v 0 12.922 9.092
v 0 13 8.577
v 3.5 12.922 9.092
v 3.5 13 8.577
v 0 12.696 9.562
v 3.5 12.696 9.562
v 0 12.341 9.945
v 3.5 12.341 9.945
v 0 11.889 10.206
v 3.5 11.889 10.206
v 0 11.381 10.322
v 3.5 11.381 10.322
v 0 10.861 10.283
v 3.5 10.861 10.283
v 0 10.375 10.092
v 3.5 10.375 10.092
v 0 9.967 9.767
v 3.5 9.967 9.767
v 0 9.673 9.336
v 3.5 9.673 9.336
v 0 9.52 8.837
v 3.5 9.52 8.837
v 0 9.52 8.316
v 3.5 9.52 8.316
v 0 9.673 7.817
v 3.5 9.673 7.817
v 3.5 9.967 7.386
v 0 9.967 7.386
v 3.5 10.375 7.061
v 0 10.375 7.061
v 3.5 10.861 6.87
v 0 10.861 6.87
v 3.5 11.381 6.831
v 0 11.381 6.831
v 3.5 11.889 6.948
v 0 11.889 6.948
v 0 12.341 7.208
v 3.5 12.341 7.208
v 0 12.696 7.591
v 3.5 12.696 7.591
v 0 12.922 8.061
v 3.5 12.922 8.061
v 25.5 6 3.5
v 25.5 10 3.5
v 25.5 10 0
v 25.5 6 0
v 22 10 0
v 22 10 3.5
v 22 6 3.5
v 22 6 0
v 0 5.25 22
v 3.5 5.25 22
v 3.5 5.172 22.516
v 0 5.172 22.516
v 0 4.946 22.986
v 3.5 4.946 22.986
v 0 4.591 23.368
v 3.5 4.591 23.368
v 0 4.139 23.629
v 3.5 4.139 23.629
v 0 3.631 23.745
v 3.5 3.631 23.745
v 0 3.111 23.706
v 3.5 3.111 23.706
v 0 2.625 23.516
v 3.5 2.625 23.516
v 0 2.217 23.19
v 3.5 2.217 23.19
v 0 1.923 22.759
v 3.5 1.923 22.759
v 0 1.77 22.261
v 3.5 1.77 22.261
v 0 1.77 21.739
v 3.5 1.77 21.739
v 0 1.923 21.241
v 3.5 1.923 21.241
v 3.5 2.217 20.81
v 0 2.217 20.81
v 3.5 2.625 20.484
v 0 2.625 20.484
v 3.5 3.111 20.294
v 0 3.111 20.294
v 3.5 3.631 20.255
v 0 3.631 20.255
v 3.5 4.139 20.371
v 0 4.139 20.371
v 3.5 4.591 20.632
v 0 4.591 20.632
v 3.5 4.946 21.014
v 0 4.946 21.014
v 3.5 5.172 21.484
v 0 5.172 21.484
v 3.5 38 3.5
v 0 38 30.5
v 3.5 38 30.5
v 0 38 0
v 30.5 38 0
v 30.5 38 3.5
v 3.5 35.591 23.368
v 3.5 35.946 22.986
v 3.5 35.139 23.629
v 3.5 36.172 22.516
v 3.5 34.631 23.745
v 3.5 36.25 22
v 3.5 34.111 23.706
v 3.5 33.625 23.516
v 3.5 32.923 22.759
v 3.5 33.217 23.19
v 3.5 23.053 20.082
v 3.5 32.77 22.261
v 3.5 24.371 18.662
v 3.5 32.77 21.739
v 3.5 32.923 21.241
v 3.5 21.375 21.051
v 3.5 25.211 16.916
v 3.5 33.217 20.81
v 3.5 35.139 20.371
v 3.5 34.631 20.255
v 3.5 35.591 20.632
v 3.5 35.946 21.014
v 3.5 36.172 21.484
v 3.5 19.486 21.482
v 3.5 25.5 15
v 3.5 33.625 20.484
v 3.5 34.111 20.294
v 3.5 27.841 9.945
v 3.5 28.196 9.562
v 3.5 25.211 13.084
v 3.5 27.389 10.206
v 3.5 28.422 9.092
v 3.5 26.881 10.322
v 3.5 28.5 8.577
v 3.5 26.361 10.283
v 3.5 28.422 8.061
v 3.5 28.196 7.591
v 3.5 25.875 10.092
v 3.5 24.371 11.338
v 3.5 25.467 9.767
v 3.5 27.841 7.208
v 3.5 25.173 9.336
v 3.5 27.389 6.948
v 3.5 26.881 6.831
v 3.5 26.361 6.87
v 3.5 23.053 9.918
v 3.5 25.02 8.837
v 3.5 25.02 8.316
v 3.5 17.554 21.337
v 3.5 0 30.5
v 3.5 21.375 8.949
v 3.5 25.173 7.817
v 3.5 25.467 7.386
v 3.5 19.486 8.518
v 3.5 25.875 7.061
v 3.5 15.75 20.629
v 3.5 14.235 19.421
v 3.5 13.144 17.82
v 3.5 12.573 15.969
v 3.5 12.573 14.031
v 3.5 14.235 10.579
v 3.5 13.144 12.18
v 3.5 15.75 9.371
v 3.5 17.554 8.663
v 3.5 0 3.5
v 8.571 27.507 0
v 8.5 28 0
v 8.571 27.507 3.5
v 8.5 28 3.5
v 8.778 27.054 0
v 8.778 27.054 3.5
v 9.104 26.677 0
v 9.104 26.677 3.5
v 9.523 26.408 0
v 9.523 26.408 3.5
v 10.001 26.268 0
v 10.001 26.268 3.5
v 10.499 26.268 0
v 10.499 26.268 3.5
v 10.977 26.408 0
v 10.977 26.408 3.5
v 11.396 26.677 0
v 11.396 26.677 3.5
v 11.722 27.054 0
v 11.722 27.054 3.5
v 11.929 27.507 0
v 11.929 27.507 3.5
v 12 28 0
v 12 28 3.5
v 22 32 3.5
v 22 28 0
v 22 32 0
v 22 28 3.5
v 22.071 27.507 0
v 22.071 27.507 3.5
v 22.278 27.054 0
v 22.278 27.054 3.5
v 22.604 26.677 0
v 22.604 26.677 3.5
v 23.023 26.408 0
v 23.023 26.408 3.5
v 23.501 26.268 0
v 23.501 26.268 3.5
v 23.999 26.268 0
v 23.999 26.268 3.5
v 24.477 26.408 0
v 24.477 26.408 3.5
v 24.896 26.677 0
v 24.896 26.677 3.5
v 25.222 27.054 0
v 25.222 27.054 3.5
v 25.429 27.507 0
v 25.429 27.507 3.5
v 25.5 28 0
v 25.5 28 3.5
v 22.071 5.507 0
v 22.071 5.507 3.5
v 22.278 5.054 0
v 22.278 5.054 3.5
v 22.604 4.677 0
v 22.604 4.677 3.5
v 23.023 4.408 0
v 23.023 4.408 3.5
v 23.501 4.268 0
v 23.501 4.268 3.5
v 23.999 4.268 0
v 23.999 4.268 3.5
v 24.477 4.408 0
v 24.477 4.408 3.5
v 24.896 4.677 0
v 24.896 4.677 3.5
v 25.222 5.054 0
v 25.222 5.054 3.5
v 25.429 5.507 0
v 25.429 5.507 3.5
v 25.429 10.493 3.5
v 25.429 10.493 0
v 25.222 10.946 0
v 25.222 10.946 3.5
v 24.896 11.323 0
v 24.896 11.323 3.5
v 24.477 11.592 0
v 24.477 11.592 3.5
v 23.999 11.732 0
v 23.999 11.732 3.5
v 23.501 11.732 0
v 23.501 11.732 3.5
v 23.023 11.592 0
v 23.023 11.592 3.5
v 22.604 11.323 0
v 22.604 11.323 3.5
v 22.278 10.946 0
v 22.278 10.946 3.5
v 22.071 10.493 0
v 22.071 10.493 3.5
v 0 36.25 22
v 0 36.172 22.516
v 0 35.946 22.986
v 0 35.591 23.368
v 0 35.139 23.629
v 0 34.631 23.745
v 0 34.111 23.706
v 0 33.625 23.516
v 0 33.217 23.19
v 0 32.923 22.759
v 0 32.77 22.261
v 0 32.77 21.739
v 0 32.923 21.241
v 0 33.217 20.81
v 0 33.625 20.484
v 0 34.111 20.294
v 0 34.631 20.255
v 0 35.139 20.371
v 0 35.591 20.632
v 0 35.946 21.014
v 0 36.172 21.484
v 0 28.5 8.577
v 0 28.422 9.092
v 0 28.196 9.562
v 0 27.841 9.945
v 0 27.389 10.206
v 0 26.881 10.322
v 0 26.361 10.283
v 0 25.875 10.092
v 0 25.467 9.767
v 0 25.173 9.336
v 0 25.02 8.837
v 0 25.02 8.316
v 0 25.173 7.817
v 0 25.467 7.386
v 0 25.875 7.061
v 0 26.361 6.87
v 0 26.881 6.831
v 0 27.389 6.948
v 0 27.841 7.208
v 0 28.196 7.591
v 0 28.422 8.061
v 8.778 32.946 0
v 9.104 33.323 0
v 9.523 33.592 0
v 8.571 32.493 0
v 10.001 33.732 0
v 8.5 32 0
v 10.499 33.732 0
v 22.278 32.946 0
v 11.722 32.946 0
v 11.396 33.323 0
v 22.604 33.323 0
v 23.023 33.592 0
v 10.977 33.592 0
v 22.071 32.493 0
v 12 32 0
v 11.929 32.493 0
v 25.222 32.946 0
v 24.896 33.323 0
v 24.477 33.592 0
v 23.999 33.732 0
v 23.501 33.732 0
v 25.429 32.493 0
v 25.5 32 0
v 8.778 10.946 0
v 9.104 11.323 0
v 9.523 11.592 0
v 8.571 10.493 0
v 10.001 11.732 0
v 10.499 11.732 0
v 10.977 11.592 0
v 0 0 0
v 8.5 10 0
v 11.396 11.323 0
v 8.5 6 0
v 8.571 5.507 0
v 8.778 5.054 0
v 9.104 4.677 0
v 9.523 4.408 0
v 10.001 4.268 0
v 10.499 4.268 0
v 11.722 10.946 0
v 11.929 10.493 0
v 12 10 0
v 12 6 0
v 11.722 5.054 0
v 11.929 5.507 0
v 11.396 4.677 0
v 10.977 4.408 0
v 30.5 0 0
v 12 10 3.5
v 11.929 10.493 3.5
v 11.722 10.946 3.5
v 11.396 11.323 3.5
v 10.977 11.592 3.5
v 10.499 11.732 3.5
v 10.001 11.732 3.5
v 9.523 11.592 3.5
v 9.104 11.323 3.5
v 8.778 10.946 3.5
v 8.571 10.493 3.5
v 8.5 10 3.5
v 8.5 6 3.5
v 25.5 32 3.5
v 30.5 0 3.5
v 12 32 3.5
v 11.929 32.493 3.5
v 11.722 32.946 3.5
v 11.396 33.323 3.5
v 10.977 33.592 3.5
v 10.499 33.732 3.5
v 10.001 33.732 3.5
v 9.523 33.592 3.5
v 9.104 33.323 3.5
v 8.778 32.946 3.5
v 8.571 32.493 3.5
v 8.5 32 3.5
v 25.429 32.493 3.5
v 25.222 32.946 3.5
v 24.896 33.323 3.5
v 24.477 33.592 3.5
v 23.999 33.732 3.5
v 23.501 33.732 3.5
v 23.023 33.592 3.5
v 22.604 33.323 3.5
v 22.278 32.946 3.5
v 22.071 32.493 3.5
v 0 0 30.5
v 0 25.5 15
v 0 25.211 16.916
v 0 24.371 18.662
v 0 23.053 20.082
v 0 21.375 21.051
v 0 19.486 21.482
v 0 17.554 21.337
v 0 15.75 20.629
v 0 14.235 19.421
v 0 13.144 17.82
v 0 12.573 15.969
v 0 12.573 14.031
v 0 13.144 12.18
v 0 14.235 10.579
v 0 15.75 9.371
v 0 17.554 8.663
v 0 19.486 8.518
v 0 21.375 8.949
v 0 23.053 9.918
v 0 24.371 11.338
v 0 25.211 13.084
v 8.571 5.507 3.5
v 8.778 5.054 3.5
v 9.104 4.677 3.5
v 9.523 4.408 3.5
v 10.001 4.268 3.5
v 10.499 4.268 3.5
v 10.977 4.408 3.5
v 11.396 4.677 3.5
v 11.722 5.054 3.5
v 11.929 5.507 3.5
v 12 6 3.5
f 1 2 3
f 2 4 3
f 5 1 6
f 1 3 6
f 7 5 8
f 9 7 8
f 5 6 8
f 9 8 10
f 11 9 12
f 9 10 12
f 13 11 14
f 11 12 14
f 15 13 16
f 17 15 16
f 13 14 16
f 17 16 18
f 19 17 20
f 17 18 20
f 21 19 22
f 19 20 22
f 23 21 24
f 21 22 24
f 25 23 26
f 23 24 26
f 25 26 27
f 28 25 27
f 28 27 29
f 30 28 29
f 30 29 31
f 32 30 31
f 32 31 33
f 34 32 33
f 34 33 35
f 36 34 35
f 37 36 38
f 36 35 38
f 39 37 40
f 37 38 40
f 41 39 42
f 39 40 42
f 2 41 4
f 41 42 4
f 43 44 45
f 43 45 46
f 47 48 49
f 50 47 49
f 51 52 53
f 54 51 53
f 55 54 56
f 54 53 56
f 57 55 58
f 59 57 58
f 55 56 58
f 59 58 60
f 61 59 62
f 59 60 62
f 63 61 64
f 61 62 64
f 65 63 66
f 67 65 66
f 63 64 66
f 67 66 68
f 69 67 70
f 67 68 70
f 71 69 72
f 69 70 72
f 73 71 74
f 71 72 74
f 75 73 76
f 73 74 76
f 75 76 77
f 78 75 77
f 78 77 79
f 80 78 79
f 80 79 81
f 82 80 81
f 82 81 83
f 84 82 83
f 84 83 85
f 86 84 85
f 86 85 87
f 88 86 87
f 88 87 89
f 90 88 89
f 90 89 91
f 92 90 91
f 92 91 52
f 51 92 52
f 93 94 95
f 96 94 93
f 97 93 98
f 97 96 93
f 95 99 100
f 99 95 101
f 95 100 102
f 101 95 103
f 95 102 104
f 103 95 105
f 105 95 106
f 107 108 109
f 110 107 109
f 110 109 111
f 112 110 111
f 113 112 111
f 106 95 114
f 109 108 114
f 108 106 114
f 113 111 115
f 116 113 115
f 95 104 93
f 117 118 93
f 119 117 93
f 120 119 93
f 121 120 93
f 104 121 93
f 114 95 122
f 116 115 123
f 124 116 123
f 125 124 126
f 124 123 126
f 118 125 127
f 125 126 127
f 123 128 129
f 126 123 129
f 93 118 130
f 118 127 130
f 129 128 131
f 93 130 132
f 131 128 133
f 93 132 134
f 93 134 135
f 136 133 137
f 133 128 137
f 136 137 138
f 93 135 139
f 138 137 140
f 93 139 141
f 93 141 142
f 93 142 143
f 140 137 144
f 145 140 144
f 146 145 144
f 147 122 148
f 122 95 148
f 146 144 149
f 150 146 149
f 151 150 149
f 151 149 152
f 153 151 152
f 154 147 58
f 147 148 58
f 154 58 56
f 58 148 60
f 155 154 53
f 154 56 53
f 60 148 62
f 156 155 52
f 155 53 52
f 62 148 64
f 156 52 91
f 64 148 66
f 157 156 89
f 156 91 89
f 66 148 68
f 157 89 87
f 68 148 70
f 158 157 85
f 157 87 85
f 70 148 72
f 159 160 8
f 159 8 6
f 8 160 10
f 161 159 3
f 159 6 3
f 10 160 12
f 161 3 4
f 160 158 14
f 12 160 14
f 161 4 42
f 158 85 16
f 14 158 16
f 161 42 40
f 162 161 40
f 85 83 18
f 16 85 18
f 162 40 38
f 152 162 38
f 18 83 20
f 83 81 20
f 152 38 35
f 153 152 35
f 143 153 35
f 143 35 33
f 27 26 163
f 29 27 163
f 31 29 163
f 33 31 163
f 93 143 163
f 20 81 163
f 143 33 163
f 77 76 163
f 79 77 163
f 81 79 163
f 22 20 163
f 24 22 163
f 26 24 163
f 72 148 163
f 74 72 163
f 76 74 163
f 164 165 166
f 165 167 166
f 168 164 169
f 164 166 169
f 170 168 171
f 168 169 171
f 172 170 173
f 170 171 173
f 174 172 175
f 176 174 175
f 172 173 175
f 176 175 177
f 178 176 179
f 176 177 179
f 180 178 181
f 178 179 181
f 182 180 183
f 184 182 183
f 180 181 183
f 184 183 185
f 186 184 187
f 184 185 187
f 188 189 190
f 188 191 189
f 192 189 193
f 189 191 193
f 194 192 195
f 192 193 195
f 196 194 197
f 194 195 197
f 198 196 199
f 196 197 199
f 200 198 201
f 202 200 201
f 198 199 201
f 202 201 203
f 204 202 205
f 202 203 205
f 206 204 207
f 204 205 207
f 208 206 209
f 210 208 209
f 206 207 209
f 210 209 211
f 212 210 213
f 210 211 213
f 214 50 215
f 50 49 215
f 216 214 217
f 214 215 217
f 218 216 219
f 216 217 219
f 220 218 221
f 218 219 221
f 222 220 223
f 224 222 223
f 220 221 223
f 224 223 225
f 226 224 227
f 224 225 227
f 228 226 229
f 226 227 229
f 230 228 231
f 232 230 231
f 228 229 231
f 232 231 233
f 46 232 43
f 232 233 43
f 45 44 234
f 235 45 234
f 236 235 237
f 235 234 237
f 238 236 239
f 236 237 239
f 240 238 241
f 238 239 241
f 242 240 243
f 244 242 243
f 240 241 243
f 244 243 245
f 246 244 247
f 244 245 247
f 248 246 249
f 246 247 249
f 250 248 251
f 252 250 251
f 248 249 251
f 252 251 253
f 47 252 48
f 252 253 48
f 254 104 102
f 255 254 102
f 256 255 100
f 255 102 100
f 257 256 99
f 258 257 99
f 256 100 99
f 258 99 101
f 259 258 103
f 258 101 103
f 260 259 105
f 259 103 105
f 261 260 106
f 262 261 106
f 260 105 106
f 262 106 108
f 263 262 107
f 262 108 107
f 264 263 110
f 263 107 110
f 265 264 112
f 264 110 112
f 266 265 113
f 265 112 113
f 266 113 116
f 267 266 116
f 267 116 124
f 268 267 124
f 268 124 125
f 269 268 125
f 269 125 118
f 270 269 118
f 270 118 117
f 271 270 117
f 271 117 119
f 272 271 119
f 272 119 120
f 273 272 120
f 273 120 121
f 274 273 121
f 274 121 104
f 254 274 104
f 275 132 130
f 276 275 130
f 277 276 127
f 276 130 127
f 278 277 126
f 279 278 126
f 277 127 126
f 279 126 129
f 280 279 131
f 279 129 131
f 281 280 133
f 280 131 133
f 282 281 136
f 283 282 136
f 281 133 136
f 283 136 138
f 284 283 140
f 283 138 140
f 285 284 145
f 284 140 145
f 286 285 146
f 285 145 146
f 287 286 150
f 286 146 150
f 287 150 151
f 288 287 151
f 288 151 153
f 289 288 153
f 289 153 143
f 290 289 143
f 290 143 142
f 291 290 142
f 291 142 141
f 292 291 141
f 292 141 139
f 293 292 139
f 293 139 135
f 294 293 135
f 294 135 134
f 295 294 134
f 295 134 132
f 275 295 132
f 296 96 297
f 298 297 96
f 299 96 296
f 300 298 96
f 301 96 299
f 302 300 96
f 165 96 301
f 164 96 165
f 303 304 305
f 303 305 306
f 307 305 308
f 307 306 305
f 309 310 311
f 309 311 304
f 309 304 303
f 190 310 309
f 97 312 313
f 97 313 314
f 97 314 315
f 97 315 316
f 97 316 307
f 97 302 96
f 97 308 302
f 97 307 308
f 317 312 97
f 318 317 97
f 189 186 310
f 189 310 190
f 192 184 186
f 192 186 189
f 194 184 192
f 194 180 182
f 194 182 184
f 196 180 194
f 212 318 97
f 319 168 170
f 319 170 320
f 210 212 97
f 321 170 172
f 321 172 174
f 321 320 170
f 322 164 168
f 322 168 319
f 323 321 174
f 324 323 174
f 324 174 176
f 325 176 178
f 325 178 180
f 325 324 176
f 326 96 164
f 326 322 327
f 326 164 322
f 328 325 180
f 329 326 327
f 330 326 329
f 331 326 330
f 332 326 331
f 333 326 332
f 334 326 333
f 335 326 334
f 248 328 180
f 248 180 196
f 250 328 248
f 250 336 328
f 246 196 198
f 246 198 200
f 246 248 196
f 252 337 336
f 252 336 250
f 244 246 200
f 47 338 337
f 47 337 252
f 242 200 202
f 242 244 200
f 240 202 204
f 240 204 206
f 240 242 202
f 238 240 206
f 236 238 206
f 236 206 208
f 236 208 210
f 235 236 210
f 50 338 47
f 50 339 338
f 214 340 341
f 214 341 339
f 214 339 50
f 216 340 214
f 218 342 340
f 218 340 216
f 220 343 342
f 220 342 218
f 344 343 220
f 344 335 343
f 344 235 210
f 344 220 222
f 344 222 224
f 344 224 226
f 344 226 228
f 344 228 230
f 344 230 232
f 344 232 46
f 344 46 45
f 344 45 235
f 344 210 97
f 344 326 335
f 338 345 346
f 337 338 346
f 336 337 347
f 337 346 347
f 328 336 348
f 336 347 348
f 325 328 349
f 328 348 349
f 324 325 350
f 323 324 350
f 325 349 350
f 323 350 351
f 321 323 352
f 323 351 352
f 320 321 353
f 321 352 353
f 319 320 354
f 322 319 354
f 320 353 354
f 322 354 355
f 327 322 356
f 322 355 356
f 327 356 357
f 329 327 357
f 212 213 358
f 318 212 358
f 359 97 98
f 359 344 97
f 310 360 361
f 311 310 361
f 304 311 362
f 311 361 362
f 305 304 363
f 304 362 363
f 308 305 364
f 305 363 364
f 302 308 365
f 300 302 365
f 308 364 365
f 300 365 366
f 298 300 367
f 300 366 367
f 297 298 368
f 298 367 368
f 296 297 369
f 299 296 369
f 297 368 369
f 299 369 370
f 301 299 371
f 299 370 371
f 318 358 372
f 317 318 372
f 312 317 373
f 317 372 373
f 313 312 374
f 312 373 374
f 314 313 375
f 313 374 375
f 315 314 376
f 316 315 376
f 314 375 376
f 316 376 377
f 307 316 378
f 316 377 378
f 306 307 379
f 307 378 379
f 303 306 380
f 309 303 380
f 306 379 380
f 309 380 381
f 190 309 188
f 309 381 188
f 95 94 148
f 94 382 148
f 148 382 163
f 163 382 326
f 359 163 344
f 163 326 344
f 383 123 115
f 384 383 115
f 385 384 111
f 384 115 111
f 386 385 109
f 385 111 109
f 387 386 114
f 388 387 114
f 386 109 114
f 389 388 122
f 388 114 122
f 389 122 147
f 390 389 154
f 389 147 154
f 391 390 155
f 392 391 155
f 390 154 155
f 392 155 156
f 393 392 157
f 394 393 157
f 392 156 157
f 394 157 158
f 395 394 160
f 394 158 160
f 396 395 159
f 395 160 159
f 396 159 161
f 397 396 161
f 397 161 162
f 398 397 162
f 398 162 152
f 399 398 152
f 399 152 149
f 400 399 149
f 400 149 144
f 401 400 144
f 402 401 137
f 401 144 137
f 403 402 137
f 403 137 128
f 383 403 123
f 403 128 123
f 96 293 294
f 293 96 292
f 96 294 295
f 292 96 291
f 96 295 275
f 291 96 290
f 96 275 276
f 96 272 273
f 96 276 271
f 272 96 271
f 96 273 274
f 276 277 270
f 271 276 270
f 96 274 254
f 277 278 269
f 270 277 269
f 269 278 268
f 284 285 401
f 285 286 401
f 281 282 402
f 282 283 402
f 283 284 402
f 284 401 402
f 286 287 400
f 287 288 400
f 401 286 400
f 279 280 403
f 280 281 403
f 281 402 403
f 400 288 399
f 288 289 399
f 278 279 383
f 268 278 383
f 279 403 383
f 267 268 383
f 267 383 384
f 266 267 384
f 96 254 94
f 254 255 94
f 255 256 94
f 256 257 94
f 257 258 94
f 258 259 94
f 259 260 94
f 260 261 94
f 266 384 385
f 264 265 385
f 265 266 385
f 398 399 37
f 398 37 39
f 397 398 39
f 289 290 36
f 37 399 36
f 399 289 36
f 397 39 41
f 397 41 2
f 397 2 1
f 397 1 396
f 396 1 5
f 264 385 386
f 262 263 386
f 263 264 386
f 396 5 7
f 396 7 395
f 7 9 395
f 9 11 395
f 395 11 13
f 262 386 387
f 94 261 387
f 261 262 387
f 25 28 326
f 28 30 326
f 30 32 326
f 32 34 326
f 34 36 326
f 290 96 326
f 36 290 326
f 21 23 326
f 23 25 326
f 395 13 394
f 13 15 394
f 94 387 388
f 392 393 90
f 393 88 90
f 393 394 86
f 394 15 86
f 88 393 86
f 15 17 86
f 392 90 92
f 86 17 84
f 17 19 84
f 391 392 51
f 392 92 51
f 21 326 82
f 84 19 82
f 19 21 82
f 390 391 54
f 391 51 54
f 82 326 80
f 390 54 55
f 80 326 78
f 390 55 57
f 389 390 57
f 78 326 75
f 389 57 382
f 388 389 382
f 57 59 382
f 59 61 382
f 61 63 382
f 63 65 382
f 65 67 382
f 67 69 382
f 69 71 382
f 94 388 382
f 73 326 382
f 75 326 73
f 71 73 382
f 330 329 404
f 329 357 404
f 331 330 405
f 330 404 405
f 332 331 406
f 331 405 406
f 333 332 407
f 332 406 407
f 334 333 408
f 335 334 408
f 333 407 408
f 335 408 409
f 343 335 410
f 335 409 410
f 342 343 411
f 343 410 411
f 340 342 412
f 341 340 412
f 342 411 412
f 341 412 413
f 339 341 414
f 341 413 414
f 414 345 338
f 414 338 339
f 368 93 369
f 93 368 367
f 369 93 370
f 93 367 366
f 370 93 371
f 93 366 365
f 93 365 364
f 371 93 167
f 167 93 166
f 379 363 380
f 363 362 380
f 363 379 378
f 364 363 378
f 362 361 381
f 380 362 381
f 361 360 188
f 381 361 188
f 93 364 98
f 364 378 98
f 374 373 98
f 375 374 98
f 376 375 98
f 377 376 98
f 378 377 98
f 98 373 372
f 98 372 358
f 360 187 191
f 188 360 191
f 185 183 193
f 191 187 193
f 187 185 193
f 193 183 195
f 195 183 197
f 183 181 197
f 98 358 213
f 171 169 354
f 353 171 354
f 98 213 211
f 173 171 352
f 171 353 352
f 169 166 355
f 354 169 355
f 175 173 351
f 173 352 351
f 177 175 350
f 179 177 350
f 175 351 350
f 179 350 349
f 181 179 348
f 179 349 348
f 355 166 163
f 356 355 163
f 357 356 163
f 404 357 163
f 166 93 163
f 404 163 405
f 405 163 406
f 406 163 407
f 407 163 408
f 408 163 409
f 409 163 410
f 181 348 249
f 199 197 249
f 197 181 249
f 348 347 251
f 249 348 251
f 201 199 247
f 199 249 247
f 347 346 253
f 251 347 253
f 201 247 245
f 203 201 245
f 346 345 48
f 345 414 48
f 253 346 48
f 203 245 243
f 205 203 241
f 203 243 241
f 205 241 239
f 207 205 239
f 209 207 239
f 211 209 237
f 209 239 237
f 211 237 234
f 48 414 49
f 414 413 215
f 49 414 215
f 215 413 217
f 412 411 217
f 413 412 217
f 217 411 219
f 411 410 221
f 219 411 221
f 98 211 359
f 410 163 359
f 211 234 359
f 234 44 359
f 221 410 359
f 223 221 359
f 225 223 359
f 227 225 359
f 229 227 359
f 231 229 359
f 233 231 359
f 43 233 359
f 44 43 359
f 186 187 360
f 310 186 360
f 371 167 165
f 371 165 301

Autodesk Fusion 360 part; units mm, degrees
sketch "Sketch1" plane through (0, 0, 0) normal (0, 1, 0) x (1, 0, 0) in component "Component"
  line L0 (0, 0) -> (30.5, 0)
  line L1 (0, 0) -> (0, -30.5)
  line L2 (30.5, 0) -> (30.5, -3.5)
  line L3 (0, -30.5) -> (3.5, -30.5)
  line L4 (3.5, -30.5) -> (3.5, -3.5)
  line L5 (3.5, -3.5) -> (30.5, -3.5)
  dimension "d3" = 3.5
  dimension "d4" = 3.5
  dimension "d24" = 27
  dimension "d25" = 27
extrude "Extrude1" add sketch "Sketch1" along normal blind 38 in component "Component"
sketch "Sketch2" plane through (3.5, 0, 0) normal (1, 0, 0) x (0, 1, 0) in component "Component"
  line L0 (0, 30.5) -> (0, 3.5)
  line L1 (0, 3.5) -> (38, 3.5)
  line L2 (38, 3.5) -> (38, 30.5)
  line L3 (38, 30.5) -> (0, 30.5)
sketch "Sketch3" plane through (0, 0, 3.5) normal (0, 0, 1) x (-1, 0, 0) in component "Component"
  line L0 (-3.5, 0) -> (-30.5, 0)
  line L1 (-30.5, 0) -> (-30.5, -38)
  line L2 (-3.5, 0) -> (-3.5, -38) construction
  line L3 (-3.5, -19) -> (-10.25, -19) construction
  line L4 (-3.5, -38) -> (-3.5, 0) construction
  line L5 (0, 0) -> (0, -38) construction
  line L6 (-10.25, -19) -> (-10.25, -28) construction
  line L7 (-10.25, -28) -> (-23.75, -28) construction
  line L8 (-10.25, -28) -> (-10.25, -32) construction
  line L9 (-10.25, -32) -> (-8.5, -32) construction
  line L10 (-10.25, -28) -> (-8.5, -28) construction
  arc A0 (-12, -32) -> (-8.5, -32) centre (-10.25, -32) ccw
  arc A1 (-8.5, -28) -> (-12, -28) centre (-10.25, -28) ccw
  line L11 (-8.5, -28) -> (-8.5, -32)
  line L12 (-12, -28) -> (-12, -32)
  line L13 (-22, -28) -> (-22, -32)
  arc A2 (-22, -28) -> (-25.5, -28) centre (-23.75, -28) ccw
  line L14 (-25.5, -28) -> (-25.5, -32)
  arc A3 (-25.5, -32) -> (-22, -32) centre (-23.75, -32) ccw
  line L15 (-8.5, -10) -> (-8.5, -6)
  arc A4 (-12, -10) -> (-8.5, -10) centre (-10.25, -10) ccw
  line L16 (-12, -10) -> (-12, -6)
  arc A5 (-8.5, -6) -> (-12, -6) centre (-10.25, -6) ccw
  line L17 (-22, -10) -> (-22, -6)
  arc A6 (-25.5, -10) -> (-22, -10) centre (-23.75, -10) ccw
  line L18 (-25.5, -10) -> (-25.5, -6)
  arc A7 (-22, -6) -> (-25.5, -6) centre (-23.75, -6) ccw
  dimension "d27" = 6.75
  dimension "d28" = 9
  dimension "d29" = 13.5
  dimension "d30" = 4
  dimension "d31" = 1.75
  dimension "d34" = -13.5
  dimension "d35" = 0
extrude "Extrude3" cut sketch "Sketch3" against normal through all in component "Component"
sketch "Sketch2 (2)" plane through (3.5, 0, 0) normal (1, 0, 0) x (0, 1, 0)
  line L0 (0, 30.5) -> (0, 3.5) construction
  line L1 (0, 3.5) -> (38, 3.5) construction
  line L2 (38, 3.5) -> (38, 30.5) construction
  line L3 (38, 30.5) -> (0, 30.5) construction
  line L4 (19, 3.5) -> (19, 15) construction
  circle A0 centre (19, 15) radius 6.5
  line L5 (19, 15) -> (19, 22) construction
  line L6 (19, 22) -> (3.5, 22) construction
  circle A1 centre (3.5, 22) radius 1.75
  line L7 (19, 22) -> (11.25, 8.5766) construction
  circle A2 centre (11.25, 8.5766) radius 1.75
  circle A3 centre (34.5, 22) radius 1.75
  circle A4 centre (26.75, 8.5766) radius 1.75
  dimension "d37" = 11.5
  dimension "d38" = 13
  dimension "d39" = 7
  dimension "d40" = 15.5
  dimension "d41" = 3.5
  dimension "d42" = 60
  dimension "d43" = 3.5
extrude "Extrude4" cut sketch "Sketch2 (2)" against normal through all in component "Component"
component "Component" placed x (1, 0, 0) y (0, 1, 0) z (0, 0, 1) at (0, 0, 0)
equation "d25 = d24"
equation "d28 = ( 18 / 2 ) * 1 mm"
equation "d31 = ( 3.5 / 2 ) * 1 mm"
equation "d40 = ( 31 / 2 ) * 1 mm"
equation "d42 = ( 360 / 6 ) * 1 deg"
equation "d43 = d41"
